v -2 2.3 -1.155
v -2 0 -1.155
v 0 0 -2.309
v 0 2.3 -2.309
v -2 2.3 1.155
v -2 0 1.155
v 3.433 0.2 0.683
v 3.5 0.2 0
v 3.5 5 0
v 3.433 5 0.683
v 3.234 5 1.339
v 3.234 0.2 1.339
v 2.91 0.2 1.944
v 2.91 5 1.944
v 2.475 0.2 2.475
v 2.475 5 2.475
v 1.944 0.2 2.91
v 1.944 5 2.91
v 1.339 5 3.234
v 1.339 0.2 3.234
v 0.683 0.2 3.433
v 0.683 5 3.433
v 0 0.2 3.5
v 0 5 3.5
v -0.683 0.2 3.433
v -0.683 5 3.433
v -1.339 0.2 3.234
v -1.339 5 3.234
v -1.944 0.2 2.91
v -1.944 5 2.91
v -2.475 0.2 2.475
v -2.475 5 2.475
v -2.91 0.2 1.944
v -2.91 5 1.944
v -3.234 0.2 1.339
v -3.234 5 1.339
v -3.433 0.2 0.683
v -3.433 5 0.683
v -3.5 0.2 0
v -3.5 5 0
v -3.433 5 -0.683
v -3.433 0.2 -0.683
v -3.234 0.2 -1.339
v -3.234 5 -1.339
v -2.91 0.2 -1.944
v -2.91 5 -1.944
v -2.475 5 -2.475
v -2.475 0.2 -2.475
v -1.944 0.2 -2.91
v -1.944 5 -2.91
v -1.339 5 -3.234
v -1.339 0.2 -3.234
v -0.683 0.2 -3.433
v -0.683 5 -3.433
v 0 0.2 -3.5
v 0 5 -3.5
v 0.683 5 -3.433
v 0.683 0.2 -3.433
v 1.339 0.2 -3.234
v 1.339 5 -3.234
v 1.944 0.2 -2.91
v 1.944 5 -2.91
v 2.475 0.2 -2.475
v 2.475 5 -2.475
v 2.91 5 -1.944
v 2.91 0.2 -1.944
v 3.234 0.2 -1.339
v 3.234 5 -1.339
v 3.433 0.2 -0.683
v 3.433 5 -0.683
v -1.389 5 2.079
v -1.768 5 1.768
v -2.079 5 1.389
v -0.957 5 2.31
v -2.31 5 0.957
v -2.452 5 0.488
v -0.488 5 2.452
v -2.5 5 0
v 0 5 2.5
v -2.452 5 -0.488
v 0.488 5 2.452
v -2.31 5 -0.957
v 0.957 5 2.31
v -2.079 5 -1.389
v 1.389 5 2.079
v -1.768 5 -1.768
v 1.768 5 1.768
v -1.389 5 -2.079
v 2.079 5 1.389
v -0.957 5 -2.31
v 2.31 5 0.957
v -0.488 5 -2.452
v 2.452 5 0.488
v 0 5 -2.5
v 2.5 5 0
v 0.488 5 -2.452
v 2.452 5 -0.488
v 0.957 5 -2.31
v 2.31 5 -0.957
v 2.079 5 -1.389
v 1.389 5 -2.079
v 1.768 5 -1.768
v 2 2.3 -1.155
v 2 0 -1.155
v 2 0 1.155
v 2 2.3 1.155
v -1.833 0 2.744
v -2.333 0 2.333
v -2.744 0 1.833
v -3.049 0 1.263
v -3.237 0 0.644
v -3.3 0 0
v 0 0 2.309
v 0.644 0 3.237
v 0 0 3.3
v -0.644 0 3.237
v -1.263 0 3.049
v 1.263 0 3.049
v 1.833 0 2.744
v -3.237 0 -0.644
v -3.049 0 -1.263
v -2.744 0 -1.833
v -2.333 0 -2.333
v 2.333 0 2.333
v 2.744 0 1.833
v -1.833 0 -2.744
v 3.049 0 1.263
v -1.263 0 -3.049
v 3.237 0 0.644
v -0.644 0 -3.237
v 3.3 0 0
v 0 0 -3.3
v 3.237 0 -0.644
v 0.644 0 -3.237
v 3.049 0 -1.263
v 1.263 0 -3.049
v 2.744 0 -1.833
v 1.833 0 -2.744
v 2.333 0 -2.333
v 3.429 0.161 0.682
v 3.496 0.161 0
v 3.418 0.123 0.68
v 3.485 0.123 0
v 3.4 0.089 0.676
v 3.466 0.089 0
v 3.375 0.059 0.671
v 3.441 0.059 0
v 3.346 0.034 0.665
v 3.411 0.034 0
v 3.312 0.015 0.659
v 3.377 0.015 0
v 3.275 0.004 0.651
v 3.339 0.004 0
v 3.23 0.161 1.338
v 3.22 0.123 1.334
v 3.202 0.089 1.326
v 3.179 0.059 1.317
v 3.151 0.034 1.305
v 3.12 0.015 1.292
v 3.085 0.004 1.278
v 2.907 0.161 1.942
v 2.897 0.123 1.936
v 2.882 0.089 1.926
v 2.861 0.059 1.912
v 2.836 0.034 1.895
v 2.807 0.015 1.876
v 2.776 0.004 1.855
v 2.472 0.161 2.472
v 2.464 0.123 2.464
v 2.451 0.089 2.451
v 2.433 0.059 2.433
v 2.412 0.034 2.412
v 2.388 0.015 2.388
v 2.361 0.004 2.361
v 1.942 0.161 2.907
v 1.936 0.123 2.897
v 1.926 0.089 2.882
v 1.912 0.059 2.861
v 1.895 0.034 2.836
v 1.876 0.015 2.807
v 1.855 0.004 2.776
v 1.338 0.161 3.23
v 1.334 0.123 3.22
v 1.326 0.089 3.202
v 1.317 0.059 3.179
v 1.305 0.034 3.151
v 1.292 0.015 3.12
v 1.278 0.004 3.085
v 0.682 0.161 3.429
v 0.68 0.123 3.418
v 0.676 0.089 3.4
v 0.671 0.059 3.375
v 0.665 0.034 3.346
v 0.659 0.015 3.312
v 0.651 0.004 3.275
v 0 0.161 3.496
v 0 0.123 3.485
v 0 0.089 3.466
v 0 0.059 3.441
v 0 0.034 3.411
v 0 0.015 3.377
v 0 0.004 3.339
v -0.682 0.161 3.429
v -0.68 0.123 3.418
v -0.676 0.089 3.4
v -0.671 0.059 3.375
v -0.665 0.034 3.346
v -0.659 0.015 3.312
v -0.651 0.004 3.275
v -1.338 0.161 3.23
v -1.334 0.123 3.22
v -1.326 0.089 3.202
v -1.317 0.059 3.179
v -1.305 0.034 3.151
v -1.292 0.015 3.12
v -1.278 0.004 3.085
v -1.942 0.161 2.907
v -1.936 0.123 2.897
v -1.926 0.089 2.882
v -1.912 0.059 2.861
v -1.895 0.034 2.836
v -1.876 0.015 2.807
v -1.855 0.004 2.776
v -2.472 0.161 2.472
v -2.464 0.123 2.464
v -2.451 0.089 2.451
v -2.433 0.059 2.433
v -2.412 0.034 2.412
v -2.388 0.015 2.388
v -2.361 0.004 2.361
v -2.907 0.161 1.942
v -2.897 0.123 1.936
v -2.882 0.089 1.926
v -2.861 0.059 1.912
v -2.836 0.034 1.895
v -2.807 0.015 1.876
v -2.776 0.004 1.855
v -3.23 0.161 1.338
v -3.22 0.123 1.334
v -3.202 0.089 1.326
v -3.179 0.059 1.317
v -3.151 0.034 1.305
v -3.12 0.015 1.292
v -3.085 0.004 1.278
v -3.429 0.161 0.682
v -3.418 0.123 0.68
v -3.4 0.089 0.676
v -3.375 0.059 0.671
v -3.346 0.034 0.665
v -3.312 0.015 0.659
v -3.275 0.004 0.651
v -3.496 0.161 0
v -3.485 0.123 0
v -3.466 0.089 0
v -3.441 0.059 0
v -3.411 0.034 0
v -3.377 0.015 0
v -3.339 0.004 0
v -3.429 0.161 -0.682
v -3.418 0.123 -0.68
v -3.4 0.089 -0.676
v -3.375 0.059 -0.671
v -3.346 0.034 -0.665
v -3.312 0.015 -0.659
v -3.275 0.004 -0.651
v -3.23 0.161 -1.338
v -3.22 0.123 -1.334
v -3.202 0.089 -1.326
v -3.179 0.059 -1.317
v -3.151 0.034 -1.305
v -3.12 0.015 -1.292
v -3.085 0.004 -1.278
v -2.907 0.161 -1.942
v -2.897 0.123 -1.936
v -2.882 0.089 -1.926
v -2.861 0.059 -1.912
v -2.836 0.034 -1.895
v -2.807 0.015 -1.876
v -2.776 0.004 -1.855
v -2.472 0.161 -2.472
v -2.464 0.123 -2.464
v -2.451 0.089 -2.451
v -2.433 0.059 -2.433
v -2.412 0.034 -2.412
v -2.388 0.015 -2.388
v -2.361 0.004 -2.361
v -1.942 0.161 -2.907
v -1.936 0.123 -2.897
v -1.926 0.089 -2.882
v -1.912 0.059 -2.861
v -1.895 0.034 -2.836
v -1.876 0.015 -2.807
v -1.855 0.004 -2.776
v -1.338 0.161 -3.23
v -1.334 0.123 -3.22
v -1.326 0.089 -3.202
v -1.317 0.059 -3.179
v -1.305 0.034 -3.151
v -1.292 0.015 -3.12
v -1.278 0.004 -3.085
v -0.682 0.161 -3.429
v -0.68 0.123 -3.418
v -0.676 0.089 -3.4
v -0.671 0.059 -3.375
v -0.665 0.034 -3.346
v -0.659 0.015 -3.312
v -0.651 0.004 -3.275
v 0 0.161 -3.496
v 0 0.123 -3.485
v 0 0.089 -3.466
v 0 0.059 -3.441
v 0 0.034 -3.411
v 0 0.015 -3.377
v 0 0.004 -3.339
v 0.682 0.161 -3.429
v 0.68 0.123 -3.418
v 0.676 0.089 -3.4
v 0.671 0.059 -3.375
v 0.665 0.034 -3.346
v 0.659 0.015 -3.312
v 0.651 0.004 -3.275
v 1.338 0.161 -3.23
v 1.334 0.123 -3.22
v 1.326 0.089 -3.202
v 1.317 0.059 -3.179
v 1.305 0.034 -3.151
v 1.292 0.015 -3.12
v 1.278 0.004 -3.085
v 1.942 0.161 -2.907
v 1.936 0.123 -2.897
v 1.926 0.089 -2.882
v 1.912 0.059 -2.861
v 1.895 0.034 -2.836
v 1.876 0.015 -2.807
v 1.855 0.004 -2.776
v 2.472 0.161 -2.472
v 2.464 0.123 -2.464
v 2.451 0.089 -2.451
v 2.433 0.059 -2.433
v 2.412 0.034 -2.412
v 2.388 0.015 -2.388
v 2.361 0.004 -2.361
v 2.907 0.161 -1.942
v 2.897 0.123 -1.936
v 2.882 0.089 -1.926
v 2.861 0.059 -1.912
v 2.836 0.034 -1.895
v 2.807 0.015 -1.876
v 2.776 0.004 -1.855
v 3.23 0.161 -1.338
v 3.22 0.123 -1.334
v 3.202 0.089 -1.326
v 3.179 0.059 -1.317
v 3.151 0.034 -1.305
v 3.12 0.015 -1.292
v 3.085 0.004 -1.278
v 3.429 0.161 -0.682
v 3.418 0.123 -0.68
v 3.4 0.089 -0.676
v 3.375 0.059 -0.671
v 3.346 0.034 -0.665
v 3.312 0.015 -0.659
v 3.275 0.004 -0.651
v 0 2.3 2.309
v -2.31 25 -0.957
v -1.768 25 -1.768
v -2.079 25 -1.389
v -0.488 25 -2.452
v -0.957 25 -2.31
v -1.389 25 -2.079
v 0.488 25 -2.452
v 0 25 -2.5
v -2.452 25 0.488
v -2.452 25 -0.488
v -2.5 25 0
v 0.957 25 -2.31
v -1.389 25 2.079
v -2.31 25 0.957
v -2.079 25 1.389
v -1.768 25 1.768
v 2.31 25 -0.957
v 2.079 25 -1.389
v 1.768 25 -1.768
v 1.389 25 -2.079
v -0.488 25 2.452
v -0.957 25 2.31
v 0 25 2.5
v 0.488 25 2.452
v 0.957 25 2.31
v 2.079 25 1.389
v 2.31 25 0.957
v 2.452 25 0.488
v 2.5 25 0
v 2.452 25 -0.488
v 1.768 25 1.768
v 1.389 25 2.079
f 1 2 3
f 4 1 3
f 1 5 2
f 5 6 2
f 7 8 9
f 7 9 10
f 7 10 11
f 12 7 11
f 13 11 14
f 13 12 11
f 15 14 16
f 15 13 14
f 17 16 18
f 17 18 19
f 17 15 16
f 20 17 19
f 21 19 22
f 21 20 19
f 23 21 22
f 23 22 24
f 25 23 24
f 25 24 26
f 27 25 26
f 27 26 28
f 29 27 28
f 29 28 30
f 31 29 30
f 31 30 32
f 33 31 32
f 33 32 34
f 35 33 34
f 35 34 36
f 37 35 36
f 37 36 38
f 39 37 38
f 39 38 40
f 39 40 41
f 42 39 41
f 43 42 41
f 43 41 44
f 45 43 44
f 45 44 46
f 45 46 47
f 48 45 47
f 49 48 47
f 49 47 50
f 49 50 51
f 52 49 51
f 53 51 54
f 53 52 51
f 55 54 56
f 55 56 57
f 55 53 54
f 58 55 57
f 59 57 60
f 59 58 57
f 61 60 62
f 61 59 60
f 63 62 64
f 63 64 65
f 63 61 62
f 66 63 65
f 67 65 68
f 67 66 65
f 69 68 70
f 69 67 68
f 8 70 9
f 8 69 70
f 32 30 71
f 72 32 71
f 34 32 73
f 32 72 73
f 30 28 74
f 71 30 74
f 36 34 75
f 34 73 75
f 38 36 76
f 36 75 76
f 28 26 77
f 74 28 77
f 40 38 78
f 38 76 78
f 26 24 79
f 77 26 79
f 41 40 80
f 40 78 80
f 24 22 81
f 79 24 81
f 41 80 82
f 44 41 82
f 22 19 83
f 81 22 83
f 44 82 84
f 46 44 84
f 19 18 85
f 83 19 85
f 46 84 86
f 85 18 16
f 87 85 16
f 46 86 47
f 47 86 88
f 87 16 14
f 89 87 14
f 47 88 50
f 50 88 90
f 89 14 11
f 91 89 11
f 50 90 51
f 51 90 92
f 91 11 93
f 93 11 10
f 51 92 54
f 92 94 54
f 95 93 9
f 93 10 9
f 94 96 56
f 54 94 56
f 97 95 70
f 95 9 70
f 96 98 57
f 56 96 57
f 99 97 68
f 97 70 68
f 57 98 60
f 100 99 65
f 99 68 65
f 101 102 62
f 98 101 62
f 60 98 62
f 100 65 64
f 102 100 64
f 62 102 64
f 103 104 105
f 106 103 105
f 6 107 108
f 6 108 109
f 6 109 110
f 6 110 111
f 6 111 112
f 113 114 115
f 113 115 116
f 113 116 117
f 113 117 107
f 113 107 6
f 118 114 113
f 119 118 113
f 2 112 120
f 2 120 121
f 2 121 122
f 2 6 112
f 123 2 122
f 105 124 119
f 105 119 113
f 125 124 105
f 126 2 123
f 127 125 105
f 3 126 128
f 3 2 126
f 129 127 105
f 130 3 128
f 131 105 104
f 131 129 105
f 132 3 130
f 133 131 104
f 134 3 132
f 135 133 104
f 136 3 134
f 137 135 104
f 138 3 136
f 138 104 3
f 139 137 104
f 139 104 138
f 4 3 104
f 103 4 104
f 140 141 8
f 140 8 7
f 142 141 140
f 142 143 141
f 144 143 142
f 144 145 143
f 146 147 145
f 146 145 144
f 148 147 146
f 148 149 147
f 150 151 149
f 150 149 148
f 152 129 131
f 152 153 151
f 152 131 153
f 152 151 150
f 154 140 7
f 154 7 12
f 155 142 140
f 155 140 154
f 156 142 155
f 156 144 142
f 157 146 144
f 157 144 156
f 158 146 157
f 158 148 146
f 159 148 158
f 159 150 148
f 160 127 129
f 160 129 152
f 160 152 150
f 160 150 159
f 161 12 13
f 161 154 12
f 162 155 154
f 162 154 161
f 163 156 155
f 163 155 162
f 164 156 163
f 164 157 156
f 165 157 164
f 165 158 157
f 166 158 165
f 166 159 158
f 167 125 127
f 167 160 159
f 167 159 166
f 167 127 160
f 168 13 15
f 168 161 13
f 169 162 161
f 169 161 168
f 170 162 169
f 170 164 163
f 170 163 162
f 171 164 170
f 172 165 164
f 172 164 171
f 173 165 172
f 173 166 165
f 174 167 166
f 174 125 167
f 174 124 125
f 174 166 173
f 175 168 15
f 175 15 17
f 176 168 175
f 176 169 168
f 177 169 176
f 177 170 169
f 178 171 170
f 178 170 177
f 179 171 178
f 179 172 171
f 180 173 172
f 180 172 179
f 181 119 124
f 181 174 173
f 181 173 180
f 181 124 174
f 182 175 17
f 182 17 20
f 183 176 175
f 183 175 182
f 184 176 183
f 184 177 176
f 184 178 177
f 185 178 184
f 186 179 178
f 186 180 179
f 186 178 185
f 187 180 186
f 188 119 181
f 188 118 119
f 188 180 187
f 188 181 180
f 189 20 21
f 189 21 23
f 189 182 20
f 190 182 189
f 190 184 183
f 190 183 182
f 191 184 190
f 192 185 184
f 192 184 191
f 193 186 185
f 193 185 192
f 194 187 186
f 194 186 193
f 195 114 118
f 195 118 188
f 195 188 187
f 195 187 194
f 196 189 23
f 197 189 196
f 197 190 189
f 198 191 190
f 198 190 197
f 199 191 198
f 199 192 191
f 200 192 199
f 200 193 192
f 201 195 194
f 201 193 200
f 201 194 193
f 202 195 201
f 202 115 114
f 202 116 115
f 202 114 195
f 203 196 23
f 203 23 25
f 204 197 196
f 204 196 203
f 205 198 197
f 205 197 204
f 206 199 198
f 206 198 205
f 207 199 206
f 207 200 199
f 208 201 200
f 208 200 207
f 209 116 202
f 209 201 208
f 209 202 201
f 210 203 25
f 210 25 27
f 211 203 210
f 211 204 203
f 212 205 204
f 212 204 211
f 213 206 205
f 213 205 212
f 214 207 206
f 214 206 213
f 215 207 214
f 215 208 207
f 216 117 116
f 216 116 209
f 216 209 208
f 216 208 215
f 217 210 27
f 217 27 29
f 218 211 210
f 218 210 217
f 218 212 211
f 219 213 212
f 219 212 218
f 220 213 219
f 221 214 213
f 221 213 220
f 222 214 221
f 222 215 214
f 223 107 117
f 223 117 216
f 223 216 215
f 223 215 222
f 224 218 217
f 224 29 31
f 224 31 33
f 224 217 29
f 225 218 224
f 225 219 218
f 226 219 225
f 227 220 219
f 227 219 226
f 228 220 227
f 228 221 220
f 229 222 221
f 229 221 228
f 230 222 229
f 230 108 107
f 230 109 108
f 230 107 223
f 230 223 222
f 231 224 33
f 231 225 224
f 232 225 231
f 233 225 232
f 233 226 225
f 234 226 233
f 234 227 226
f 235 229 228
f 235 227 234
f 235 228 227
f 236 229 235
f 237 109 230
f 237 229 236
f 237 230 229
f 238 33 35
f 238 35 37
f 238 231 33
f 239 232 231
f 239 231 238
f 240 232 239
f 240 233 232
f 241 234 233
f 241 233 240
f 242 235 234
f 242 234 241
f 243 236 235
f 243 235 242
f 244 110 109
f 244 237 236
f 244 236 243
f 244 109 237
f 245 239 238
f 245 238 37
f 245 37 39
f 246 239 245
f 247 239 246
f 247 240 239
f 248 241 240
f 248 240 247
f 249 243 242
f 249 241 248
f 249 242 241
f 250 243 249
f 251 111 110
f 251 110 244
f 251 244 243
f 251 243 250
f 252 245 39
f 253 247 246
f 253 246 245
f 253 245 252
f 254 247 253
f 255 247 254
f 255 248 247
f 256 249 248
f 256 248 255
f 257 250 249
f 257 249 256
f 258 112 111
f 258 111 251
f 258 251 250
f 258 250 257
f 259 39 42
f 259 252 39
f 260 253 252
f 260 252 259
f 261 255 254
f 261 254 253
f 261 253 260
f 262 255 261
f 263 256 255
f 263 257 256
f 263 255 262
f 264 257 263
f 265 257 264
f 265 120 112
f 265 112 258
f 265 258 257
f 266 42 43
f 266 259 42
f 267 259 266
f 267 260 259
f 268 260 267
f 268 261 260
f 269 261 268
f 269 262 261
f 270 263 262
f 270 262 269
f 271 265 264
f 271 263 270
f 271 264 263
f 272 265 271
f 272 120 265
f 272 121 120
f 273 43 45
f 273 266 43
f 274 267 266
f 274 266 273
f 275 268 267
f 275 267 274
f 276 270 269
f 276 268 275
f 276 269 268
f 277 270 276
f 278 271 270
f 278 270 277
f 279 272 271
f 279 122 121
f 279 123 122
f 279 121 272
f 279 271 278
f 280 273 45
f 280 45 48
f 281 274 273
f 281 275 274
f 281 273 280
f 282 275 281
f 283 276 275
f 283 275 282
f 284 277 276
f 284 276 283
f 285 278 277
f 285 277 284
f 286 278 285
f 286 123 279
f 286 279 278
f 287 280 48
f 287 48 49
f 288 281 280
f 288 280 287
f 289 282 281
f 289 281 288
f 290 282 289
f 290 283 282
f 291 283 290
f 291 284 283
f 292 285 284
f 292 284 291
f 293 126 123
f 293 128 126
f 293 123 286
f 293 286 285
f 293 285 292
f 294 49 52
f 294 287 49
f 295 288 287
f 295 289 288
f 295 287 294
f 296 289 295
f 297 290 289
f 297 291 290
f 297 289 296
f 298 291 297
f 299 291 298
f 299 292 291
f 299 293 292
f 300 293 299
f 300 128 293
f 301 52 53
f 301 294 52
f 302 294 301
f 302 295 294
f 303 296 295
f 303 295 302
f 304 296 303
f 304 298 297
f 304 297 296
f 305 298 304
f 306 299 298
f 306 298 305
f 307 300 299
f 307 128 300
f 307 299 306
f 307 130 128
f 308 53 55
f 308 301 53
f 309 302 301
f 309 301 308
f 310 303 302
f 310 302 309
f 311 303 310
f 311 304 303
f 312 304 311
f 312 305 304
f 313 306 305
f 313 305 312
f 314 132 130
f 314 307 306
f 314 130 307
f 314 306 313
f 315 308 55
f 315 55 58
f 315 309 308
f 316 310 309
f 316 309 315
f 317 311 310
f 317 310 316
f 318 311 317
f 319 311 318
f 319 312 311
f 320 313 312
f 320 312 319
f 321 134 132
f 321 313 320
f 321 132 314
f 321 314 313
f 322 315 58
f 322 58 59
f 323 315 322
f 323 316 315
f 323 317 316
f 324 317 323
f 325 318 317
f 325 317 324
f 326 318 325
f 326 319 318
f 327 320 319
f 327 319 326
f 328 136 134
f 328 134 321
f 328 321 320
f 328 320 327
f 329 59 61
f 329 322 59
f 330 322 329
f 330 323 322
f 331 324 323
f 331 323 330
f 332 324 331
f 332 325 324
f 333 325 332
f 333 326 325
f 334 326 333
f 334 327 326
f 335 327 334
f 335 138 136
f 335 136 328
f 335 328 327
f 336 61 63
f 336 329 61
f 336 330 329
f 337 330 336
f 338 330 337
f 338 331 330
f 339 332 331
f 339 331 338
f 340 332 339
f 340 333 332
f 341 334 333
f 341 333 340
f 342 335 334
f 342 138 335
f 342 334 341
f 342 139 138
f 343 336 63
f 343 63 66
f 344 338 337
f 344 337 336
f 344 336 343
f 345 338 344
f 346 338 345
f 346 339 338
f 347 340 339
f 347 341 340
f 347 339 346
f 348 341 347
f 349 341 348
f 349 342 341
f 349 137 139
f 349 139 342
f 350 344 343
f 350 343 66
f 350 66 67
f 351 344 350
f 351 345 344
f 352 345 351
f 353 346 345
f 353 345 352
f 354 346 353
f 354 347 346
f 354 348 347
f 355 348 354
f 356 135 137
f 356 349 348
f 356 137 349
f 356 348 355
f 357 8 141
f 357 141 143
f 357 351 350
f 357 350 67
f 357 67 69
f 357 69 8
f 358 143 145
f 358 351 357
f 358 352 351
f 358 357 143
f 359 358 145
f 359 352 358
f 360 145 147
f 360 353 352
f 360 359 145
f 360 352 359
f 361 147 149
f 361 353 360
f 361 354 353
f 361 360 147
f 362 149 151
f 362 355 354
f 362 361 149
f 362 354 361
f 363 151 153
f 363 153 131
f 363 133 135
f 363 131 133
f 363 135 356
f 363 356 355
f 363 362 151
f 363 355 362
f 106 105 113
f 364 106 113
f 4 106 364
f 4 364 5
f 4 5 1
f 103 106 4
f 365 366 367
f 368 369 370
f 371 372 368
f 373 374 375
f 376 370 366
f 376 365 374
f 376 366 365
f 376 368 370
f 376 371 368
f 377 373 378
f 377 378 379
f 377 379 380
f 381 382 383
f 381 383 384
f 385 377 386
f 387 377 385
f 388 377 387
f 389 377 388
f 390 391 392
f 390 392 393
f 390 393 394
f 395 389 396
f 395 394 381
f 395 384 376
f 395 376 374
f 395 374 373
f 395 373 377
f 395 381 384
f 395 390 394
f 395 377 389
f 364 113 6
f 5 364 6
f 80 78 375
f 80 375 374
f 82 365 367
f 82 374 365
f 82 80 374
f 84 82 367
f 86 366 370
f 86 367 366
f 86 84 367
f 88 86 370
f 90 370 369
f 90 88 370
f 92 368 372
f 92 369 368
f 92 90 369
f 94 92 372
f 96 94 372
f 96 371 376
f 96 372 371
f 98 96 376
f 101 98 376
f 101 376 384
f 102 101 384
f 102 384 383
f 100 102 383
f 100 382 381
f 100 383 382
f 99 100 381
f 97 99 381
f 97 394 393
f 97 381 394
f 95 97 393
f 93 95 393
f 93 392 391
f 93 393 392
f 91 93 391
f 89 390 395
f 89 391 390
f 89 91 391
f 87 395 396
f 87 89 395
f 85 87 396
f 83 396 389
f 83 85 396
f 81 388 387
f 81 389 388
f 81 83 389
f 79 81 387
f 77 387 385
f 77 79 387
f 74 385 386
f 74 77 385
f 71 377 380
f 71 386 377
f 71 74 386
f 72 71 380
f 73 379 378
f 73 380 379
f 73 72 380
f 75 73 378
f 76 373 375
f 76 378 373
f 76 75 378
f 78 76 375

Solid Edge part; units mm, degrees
sketch "Sketch1" plane through (0, 0, 0) normal (0, -1, 0) x (1, 0, 0)
  circle A0 centre (0, 0) radius 3.5
extrude "Protrusion1" add sketch "Sketch1" against normal blind 5
sketch "Sketch2" plane through (0, 5, 0) normal (0, 1, 0) x (-1, 0, 0)
  circle A0 centre (0, 0) radius 2.5
extrude "ExtrudedProtrusion_2" add sketch "Sketch2" along normal blind 20
fillet "Round_1" radius 0.2 1 edges at (-3.5, 0, 0)
sketch "Sketch3" plane through (0, 0, 0) normal (0, -1, 0) x (1, 0, 0)
  line L0 (0, 2.3094) -> (-2, 1.1547)
  line L1 (-2, 1.1547) -> (-2, -1.1547)
  line L2 (-2, -1.1547) -> (0, -2.3094)
  line L3 (0, -2.3094) -> (2, -1.1547)
  line L4 (2, -1.1547) -> (2, 1.1547)
  line L5 (2, 1.1547) -> (0, 2.3094)
extrude "ExtrudedCutout_2" cut sketch "Sketch3" against normal blind 2.3
properties material "Steel"
